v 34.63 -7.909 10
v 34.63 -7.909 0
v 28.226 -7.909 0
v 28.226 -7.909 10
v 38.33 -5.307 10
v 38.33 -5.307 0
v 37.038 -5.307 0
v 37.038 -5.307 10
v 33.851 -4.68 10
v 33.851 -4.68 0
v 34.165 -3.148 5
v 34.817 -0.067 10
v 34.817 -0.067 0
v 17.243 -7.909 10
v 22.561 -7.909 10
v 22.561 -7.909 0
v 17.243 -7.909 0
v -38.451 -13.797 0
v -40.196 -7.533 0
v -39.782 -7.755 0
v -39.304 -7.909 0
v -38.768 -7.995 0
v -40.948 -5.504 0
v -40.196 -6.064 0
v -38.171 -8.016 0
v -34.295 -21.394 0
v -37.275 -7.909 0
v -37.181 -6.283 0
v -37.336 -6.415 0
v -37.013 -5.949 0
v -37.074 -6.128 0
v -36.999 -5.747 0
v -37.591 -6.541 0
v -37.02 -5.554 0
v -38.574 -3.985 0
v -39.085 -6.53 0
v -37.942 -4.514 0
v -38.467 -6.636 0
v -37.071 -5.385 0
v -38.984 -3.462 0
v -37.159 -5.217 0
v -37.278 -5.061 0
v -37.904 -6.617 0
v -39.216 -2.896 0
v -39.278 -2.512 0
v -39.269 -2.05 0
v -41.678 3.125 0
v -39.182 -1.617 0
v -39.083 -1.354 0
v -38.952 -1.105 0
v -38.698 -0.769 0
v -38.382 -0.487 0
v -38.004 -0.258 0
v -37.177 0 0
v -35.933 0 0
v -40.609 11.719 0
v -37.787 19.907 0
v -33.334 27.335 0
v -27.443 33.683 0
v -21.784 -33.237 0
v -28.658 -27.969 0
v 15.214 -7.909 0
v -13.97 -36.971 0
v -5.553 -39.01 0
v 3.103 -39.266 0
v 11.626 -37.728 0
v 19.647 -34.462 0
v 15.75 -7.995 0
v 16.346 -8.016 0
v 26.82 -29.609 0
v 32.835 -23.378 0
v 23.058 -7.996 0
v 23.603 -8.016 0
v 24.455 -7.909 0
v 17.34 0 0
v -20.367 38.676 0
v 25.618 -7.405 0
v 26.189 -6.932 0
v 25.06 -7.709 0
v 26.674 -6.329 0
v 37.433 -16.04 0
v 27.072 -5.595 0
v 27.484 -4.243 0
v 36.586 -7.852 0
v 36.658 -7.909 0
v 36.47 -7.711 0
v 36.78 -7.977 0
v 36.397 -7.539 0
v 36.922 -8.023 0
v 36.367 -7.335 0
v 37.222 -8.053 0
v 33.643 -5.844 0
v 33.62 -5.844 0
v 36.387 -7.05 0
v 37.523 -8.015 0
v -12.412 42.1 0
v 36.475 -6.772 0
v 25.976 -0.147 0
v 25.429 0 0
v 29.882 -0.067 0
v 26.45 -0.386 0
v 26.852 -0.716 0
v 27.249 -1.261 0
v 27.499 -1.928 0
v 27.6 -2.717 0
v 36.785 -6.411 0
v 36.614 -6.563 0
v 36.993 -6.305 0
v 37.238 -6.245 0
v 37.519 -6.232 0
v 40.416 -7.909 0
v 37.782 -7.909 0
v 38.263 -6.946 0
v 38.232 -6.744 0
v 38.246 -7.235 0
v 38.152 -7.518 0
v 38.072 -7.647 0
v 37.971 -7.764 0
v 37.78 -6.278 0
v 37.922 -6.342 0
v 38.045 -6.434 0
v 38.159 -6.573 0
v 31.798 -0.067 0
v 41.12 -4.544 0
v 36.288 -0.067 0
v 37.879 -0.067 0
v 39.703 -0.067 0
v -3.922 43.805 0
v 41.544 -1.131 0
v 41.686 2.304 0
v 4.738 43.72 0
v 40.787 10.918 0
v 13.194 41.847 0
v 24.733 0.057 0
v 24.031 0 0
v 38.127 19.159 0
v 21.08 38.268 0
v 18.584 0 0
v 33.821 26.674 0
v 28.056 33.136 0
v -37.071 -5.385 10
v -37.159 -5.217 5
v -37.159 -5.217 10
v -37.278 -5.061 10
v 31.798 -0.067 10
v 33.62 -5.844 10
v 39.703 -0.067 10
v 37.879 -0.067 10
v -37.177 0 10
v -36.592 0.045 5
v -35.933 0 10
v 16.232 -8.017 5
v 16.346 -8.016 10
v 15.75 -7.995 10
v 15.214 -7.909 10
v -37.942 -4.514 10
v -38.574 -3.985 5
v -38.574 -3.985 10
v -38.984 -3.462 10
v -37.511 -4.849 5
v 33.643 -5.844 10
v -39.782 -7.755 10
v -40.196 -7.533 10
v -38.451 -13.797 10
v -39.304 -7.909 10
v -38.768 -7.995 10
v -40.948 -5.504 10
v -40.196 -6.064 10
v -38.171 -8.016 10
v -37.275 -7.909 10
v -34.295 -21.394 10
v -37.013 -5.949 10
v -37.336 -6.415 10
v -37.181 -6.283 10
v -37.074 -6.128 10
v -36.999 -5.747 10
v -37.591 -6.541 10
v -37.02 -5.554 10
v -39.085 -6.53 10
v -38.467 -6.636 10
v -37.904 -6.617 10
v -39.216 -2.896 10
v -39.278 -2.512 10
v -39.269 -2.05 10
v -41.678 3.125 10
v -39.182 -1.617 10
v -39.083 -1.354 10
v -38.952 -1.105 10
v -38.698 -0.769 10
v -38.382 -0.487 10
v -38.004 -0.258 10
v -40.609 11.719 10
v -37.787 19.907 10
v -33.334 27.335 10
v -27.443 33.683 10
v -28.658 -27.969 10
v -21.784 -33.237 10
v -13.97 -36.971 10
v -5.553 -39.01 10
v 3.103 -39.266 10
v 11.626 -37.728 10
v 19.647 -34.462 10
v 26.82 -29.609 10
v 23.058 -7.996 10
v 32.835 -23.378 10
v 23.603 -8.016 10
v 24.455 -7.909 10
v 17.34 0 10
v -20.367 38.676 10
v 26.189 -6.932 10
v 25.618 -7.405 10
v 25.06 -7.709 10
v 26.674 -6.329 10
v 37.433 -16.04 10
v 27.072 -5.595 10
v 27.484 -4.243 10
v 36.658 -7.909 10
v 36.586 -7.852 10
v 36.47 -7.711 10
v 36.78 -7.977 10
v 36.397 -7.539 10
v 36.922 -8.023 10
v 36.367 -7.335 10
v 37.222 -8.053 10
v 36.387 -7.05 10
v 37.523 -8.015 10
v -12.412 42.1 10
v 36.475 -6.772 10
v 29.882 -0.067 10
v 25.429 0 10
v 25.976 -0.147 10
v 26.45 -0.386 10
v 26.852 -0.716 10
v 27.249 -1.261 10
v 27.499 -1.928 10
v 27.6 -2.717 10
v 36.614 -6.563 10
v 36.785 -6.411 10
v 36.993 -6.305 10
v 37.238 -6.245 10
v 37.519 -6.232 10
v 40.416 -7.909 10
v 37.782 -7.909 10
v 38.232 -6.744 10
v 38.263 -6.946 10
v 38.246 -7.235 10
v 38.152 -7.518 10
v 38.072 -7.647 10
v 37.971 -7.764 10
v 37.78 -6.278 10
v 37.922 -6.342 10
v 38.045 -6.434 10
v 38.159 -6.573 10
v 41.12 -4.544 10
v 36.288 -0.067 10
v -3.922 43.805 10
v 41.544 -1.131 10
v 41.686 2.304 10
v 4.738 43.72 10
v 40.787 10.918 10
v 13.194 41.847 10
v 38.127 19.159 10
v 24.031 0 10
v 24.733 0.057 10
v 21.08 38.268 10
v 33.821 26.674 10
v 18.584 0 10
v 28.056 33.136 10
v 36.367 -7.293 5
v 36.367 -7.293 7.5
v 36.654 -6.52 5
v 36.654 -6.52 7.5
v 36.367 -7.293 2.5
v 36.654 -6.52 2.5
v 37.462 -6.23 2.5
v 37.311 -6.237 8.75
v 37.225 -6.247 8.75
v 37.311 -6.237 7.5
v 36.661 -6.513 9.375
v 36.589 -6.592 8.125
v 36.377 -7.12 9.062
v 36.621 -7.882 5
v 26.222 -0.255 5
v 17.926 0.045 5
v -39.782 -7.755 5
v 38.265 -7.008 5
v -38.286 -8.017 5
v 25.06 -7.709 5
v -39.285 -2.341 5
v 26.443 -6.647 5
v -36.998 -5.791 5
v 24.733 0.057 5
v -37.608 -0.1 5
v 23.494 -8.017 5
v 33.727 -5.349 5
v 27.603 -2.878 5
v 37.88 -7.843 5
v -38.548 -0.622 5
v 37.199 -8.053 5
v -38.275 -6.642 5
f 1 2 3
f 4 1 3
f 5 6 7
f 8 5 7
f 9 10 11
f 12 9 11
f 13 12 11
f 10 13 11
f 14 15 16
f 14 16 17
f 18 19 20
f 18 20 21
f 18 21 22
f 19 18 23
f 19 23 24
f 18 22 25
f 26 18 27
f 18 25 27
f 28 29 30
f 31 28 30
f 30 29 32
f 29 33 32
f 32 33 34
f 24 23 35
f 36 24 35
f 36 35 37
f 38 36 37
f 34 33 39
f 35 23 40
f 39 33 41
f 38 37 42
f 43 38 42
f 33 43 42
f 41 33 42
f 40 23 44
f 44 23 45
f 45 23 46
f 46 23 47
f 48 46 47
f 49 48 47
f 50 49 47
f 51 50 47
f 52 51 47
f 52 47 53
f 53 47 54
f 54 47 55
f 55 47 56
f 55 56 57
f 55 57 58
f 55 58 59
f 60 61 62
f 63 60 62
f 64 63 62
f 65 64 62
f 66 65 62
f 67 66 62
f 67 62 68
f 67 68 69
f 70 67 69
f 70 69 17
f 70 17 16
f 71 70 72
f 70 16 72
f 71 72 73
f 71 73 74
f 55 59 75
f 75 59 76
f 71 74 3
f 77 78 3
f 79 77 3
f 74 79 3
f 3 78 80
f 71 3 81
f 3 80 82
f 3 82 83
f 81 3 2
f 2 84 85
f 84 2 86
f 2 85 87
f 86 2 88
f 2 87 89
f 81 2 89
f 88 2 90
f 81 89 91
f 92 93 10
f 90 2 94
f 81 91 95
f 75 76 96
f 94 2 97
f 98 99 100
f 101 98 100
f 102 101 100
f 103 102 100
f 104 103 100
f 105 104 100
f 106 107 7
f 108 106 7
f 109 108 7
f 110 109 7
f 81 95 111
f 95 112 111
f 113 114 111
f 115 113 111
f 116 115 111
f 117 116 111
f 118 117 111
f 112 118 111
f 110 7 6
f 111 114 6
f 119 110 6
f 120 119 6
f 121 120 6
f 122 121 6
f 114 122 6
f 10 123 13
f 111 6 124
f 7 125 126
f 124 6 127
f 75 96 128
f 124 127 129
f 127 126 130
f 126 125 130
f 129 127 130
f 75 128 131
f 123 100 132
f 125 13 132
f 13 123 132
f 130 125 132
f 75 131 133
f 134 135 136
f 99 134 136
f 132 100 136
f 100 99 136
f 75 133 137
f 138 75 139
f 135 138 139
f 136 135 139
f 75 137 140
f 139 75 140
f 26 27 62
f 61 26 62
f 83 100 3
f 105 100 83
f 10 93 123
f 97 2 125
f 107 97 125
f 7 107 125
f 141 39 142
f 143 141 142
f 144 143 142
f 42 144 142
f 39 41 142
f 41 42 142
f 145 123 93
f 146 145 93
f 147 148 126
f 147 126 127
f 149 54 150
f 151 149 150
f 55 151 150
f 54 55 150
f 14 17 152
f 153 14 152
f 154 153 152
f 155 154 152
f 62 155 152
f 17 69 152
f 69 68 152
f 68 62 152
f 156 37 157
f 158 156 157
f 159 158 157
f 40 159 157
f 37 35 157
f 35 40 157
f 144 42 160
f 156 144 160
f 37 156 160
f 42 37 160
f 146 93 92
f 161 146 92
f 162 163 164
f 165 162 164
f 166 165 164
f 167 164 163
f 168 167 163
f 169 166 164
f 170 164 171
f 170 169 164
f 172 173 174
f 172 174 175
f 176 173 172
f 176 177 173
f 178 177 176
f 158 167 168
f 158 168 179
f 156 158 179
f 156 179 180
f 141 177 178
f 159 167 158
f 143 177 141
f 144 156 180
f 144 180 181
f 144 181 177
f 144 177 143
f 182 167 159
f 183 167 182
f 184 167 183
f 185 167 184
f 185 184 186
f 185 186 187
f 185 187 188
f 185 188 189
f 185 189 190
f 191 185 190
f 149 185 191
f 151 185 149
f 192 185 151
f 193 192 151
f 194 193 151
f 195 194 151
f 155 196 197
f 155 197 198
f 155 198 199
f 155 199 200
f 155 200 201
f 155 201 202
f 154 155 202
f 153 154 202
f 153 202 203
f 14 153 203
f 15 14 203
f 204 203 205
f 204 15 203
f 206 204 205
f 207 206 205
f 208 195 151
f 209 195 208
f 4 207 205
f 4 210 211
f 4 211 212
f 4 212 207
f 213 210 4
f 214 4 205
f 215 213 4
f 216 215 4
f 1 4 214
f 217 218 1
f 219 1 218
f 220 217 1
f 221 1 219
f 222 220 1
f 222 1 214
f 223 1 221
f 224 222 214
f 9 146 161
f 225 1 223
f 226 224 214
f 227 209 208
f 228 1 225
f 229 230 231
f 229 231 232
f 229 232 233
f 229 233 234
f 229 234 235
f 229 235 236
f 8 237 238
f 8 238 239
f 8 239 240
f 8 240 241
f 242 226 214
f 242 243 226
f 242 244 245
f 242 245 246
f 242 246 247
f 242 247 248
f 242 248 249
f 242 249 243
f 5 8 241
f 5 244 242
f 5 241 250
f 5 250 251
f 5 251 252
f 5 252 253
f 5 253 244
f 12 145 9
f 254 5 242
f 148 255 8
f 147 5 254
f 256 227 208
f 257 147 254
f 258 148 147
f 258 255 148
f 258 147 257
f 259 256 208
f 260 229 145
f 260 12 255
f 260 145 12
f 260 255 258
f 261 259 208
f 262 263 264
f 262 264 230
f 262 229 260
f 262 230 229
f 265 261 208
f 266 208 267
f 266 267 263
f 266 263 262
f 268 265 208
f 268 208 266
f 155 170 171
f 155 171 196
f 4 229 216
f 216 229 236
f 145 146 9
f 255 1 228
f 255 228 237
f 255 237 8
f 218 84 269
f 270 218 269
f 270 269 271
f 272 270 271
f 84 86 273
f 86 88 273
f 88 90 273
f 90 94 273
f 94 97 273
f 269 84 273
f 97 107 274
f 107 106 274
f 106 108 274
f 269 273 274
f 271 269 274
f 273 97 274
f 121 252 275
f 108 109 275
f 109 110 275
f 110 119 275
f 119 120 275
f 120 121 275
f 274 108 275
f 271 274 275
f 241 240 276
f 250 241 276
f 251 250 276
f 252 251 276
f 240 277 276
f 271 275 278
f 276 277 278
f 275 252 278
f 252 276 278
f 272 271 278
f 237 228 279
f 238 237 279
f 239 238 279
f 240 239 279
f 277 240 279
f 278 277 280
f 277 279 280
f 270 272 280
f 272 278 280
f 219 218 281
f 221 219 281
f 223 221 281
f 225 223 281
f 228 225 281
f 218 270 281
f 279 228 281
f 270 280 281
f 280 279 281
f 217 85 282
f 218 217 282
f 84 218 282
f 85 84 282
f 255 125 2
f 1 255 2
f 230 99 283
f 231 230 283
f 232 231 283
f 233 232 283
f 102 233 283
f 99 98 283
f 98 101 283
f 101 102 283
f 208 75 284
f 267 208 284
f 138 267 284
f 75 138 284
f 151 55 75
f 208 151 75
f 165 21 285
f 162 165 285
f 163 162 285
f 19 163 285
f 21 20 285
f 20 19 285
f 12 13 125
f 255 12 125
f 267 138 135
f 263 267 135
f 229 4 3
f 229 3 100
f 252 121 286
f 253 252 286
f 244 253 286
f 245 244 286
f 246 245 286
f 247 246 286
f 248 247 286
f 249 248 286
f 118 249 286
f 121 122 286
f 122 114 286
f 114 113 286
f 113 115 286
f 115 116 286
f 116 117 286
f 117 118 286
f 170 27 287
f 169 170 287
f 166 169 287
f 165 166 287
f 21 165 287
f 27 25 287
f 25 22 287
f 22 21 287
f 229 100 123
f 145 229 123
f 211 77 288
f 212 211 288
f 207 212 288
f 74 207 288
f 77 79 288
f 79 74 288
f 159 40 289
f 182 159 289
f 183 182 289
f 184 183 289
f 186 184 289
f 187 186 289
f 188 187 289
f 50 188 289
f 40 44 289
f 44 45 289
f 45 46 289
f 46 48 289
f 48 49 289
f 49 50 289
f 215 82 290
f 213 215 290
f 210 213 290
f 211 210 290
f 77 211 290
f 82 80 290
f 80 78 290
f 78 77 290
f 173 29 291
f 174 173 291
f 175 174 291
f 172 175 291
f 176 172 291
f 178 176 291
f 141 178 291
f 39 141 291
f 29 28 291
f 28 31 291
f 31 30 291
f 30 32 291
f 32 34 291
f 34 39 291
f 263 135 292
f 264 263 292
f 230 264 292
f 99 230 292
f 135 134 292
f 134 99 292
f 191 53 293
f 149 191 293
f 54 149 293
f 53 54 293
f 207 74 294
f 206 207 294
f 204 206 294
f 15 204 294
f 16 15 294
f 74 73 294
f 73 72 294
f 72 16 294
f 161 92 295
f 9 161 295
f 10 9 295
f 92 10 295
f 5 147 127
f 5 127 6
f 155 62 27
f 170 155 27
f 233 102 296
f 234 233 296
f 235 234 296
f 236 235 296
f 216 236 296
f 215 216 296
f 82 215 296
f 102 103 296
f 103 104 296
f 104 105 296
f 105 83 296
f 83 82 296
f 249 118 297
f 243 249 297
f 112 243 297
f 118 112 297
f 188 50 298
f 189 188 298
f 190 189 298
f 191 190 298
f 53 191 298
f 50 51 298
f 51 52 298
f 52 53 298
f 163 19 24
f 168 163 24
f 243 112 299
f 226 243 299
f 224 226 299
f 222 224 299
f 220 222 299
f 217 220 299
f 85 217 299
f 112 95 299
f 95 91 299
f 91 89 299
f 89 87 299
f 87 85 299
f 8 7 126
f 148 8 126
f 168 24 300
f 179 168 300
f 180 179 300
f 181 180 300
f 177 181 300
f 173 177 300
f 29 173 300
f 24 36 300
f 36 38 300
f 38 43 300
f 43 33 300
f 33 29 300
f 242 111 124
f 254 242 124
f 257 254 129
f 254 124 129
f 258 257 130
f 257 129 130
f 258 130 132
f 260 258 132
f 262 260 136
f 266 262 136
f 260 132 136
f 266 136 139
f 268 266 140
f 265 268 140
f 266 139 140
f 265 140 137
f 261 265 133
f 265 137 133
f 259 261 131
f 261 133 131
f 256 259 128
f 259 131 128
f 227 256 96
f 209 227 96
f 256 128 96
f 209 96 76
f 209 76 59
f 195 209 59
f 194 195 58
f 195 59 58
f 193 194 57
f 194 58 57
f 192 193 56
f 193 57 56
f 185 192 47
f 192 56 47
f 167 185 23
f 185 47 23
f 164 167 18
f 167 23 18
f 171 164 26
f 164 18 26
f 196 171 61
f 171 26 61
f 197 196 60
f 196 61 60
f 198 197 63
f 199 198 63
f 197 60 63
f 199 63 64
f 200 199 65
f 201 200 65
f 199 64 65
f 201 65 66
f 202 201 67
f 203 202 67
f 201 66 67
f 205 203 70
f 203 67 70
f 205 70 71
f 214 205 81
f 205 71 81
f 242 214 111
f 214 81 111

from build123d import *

# Parameters (mm, degrees)
F1_DEPTH = 10


with BuildPart() as f1:
    # F0 (on Top) → F1 (new body)
    with BuildSketch(Plane.XY):
        with BuildLine():
            ThreePointArc((40.4156393511, -7.9090867682), (41.3673030509, -2.8418043205), (41.6861501393, 2.3041991517))
            ThreePointArc((41.6861501393, 2.3041991517), (-5.1460034722, 43.6715022026), (-40.4156393511, -7.9090867682))
            Line((-40.4156393511, -7.9090867682), (-40.4156393511, 0))
            Line((-40.4156393511, 0), (-37.1771354638, 0))
            add(Edge.make_bspline(
                [(-37.1771354638, 0), (-36.8978650572, 0.0446259236), (-36.5915409745, 0.0446259236)],
                knots=[0.6161917381, 0.6161917381, 0.6161917381, 1, 1, 1], degree=2))
            add(Edge.make_bspline(
                [(-36.5915409745, 0.0446259236), (-36.2539809593, 0.0446259236), (-35.9330292975, 0)],
                knots=[0, 0, 0, 0.2900730853, 0.2900730853, 0.2900730853], degree=2))
            Line((-35.9330292975, 0), (17.3402957465, 0))
            add(Edge.make_bspline(
                [(17.3402957465, 0), (17.6195661531, 0.0446259236), (17.9258902358, 0.0446259236)],
                knots=[0.6161917381, 0.6161917381, 0.6161917381, 1, 1, 1], degree=2))
            add(Edge.make_bspline(
                [(17.9258902358, 0.0446259236), (18.263450251, 0.0446259236), (18.5844019128, 0)],
                knots=[0, 0, 0, 0.2900730853, 0.2900730853, 0.2900730853], degree=2))
            Line((18.5844019128, 0), (24.0306765024, 0))
            add(Edge.make_bspline(
                [(24.0306765024, 0), (24.369078423, 0.0566405953), (24.7330599673, 0.0566405953)],
                knots=[0.7021583014, 0.7021583014, 0.7021583014, 1, 1, 1], degree=2))
            add(Edge.make_bspline(
                [(24.7330599673, 0.0566405953), (25.1035042565, 0.0566405953), (25.4286990035, 0)],
                knots=[0, 0, 0, 0.2708012802, 0.2708012802, 0.2708012802], degree=2))
            Line((25.4286990035, 0), (40.4156393511, 0))
            Line((40.4156393511, 0), (40.4156393511, -7.9090867682))
        make_face()
        with BuildLine():
            Line((-39.3036225538, -7.9090867682), (-40.4156393511, -7.9090867682))
            ThreePointArc((-40.4156393511, -7.9090867682), (0, -39.3819509876), (40.4156393511, -7.9090867682))
            Line((40.4156393511, -7.9090867682), (37.7818098534, -7.9090867682))
            add(Edge.make_bspline(
                [(37.7818098534, -7.9090867682), (37.5360380286, -8.053262829), (37.1991400882, -8.053262829)],
                knots=[0.2939431181, 0.2939431181, 0.2939431181, 1, 1, 1], degree=2))
            add(Edge.make_bspline(
                [(37.1991400882, -8.053262829), (36.8661003441, -8.053262829), (36.6575202765, -7.9090867682)],
                knots=[0, 0, 0, 0.8473185457, 0.8473185457, 0.8473185457], degree=2))
            Line((36.6575202765, -7.9090867682), (34.6297167175, -7.9090867682))
            Line((34.6297167175, -7.9090867682), (32.7949047047, -7.9090867682))
            Line((32.7949047047, -7.9090867682), (29.7002685409, -7.9090867682))
            Line((29.7002685409, -7.9090867682), (28.2258966802, -7.9090867682))
            Line((28.2258966802, -7.9090867682), (24.4546855592, -7.9090867682))
            add(Edge.make_bspline(
                [(24.4546855592, -7.9090867682), (23.9989033781, -8.0172188138), (23.4938323964, -8.0172188138)],
                knots=[0.5796214889, 0.5796214889, 0.5796214889, 1, 1, 1], degree=2))
            add(Edge.make_bspline(
                [(23.4938323964, -8.0172188138), (22.9862299942, -8.0172188138), (22.5610753448, -7.9090867682)],
                knots=[0, 0, 0, 0.3696747706, 0.3696747706, 0.3696747706], degree=2))
            Line((22.5610753448, -7.9090867682), (17.2428330681, -7.9090867682))
            add(Edge.make_bspline(
                [(17.2428330681, -7.9090867682), (16.7839236692, -8.0172188138), (16.2318215205, -8.0172188138)],
                knots=[0.5928274645, 0.5928274645, 0.5928274645, 1, 1, 1], degree=2))
            add(Edge.make_bspline(
                [(16.2318215205, -8.0172188138), (15.671241471, -8.0172188138), (15.2138086565, -7.9090867682)],
                knots=[0, 0, 0, 0.4726565934, 0.4726565934, 0.4726565934], degree=2))
            Line((15.2138086565, -7.9090867682), (12.4883930827, -7.9090867682))
            Line((12.4883930827, -7.9090867682), (10.8526813444, -7.9090867682))
            Line((10.8526813444, -7.9090867682), (5.8374140839, -7.9090867682))
            Line((5.8374140839, -7.9090867682), (3.4190323008, -7.9090867682))
            Line((3.4190323008, -7.9090867682), (-1.5962349597, -7.9090867682))
            Line((-1.5962349597, -7.9090867682), (-4.0146167428, -7.9090867682))
            Line((-4.0146167428, -7.9090867682), (-4.9603430469, -7.9090867682))
            Line((-4.9603430469, -7.9090867682), (-6.5531452432, -7.9090867682))
            Line((-6.5531452432, -7.9090867682), (-10.1403829484, -7.9090867682))
            Line((-10.1403829484, -7.9090867682), (-11.8567646255, -7.9090867682))
            Line((-11.8567646255, -7.9090867682), (-14.7128237363, -7.9090867682))
            Line((-14.7128237363, -7.9090867682), (-16.3056259326, -7.9090867682))
            Line((-16.3056259326, -7.9090867682), (-19.8928636378, -7.9090867682))
            Line((-19.8928636378, -7.9090867682), (-21.6092453149, -7.9090867682))
            Line((-21.6092453149, -7.9090867682), (-22.2374410087, -7.9090867682))
            Line((-22.2374410087, -7.9090867682), (-26.6193634304, -7.9090867682))
            Line((-26.6193634304, -7.9090867682), (-28.5073832753, -7.9090867682))
            Line((-28.5073832753, -7.9090867682), (-30.1482441586, -7.9090867682))
            Line((-30.1482441586, -7.9090867682), (-32.6747579873, -7.9090867682))
            Line((-32.6747579873, -7.9090867682), (-34.3104697256, -7.9090867682))
            Line((-34.3104697256, -7.9090867682), (-37.2745981422, -7.9090867682))
            add(Edge.make_bspline(
                [(-37.2745981422, -7.9090867682), (-37.7335075411, -8.0172188138), (-38.2856096898, -8.0172188138)],
                knots=[0.5928274645, 0.5928274645, 0.5928274645, 1, 1, 1], degree=2))
            add(Edge.make_bspline(
                [(-38.2856096898, -8.0172188138), (-38.8461897393, -8.0172188138), (-39.3036225538, -7.9090867682)],
                knots=[0, 0, 0, 0.4726565934, 0.4726565934, 0.4726565934], degree=2))
        make_face()
        with BuildLine():
            Line((-40.4156393511, 0), (-40.4156393511, -7.9090867682))
            Line((-40.4156393511, -7.9090867682), (-39.3036225538, -7.9090867682))
            add(Edge.make_bspline(
                [(-39.3036225538, -7.9090867682), (-39.8139807759, -7.788443743), (-40.1959424964, -7.5331991809)],
                knots=[0.4726565934, 0.4726565934, 0.4726565934, 1, 1, 1], degree=2))
            Line((-40.1959424964, -7.5331991809), (-40.1959424964, -6.0639764653))
            add(Edge.make_bspline(
                [(-40.1959424964, -6.0639764653), (-39.1609643451, -6.6423970904), (-38.2753113997, -6.6423970904)],
                knots=[0, 0, 0, 1, 1, 1], degree=2))
            add(Edge.make_bspline(
                [(-38.2753113997, -6.6423970904), (-37.6745778127, -6.6423970904), (-37.3364506223, -6.4149765182)],
                knots=[0, 0, 0, 1, 1, 1], degree=2))
            add(Edge.make_bspline(
                [(-37.3364506223, -6.4149765182), (-36.998323432, -6.187555946), (-36.998323432, -5.7910717786)],
                knots=[0, 0, 0, 1, 1, 1], degree=2))
            add(Edge.make_bspline(
                [(-36.998323432, -5.7910717786), (-36.998323432, -5.5593602522), (-37.0712696532, -5.385147512)],
                knots=[0, 0, 0, 1, 1, 1], degree=2))
            add(Edge.make_bspline(
                [(-37.0712696532, -5.385147512), (-37.1442158745, -5.2109347717), (-37.2780936453, -5.060751375)],
                knots=[0, 0, 0, 1, 1, 1], degree=2))
            add(Edge.make_bspline(
                [(-37.2780936453, -5.060751375), (-37.4119714161, -4.9105679782), (-37.9423333544, -4.5140838108)],
                knots=[0, 0, 0, 1, 1, 1], degree=2))
            add(Edge.make_bspline(
                [(-37.9423333544, -4.5140838108), (-38.6838102389, -3.9820054909), (-38.9841770324, -3.4619418427)],
                knots=[0, 0, 0, 1, 1, 1], degree=2))
            add(Edge.make_bspline(
                [(-38.9841770324, -3.4619418427), (-39.2845438259, -2.9418781946), (-39.2845438259, -2.3411446076)],
                knots=[0, 0, 0, 1, 1, 1], degree=2))
            add(Edge.make_bspline(
                [(-39.2845438259, -2.3411446076), (-39.2845438259, -1.6494427917), (-38.9515657805, -1.1053498001)],
                knots=[0, 0, 0, 1, 1, 1], degree=2))
            add(Edge.make_bspline(
                [(-38.9515657805, -1.1053498001), (-38.6185877352, -0.5612568084), (-38.0041230947, -0.2583154424)],
                knots=[0, 0, 0, 1, 1, 1], degree=2))
            add(Edge.make_bspline(
                [(-38.0041230947, -0.2583154424), (-37.6254950599, -0.0716454755), (-37.1771354638, 0)],
                knots=[0, 0, 0, 0.6161917381, 0.6161917381, 0.6161917381], degree=2))
            Line((-37.1771354638, 0), (-40.4156393511, 0))
        make_face()
        with BuildLine():
            Line((37.7818098534, -7.9090867682), (40.4156393511, -7.9090867682))
            Line((40.4156393511, -7.9090867682), (40.4156393511, 0))
            Line((40.4156393511, 0), (25.4286990035, 0))
            add(Edge.make_bspline(
                [(25.4286990035, 0), (26.3043654444, -0.1525186646), (26.8519331477, -0.7157311594)],
                knots=[0.2708012802, 0.2708012802, 0.2708012802, 1, 1, 1], degree=2))
            add(Edge.make_bspline(
                [(26.8519331477, -0.7157311594), (27.6028501314, -1.4881029141), (27.6028501314, -2.8783720725)],
                knots=[0, 0, 0, 1, 1, 1], degree=2))
            add(Edge.make_bspline(
                [(27.6028501314, -2.8783720725), (27.6028501314, -4.3956534751), (27.0716300023, -5.5945460766)],
                knots=[0, 0, 0, 1, 1, 1], degree=2))
            add(Edge.make_bspline(
                [(27.0716300023, -5.5945460766), (26.5404098733, -6.793438678), (25.6178547218, -7.4053287459)],
                knots=[0, 0, 0, 1, 1, 1], degree=2))
            add(Edge.make_bspline(
                [(25.6178547218, -7.4053287459), (25.0831219313, -7.7599933781), (24.4546855592, -7.9090867682)],
                knots=[0, 0, 0, 0.5796214889, 0.5796214889, 0.5796214889], degree=2))
            Line((24.4546855592, -7.9090867682), (28.2258966802, -7.9090867682))
            Line((28.2258966802, -7.9090867682), (29.8822049986, -0.0669388854))
            Line((29.8822049986, -0.0669388854), (31.7976869503, -0.0669388854))
            Line((31.7976869503, -0.0669388854), (33.6204842914, -5.8442796106))
            Line((33.6204842914, -5.8442796106), (33.6427972532, -5.8442796106))
            add(Edge.make_bspline(
                [(33.6427972532, -5.8442796106), (33.7063033752, -5.4357807714), (33.851337627, -4.6797146427)],
                knots=[0, 0, 0, 1, 1, 1], degree=2))
            add(Edge.make_bspline(
                [(33.851337627, -4.6797146427), (33.9963718787, -3.9236485139), (34.8168023203, -0.0669388854)],
                knots=[0, 0, 0, 1, 1, 1], degree=2))
            Line((34.8168023203, -0.0669388854), (36.2877414176, -0.0669388854))
            Line((36.2877414176, -0.0669388854), (34.6297167175, -7.9090867682))
            Line((34.6297167175, -7.9090867682), (36.6575202765, -7.9090867682))
            add(Edge.make_bspline(
                [(36.6575202765, -7.9090867682), (36.6199354647, -7.8831071519), (36.5863918294, -7.8524461728)],
                knots=[0.8473185457, 0.8473185457, 0.8473185457, 1, 1, 1], degree=2))
            add(Edge.make_bspline(
                [(36.5863918294, -7.8524461728), (36.3666949748, -7.6516295166), (36.3666949748, -7.2929057461)],
                knots=[0, 0, 0, 1, 1, 1], degree=2))
            add(Edge.make_bspline(
                [(36.3666949748, -7.2929057461), (36.3666949748, -6.8088861131), (36.6541889057, -6.5196758005)],
                knots=[0, 0, 0, 1, 1, 1], degree=2))
            add(Edge.make_bspline(
                [(36.6541889057, -6.5196758005), (36.9416828366, -6.2304654879), (37.4617464848, -6.2304654879)],
                knots=[0, 0, 0, 1, 1, 1], degree=2))
            add(Edge.make_bspline(
                [(37.4617464848, -6.2304654879), (37.8256194003, -6.2304654879), (38.045316255, -6.4338567167)],
                knots=[0, 0, 0, 1, 1, 1], degree=2))
            add(Edge.make_bspline(
                [(38.045316255, -6.4338567167), (38.2650131097, -6.6372479454), (38.2650131097, -7.0079863877)],
                knots=[0, 0, 0, 1, 1, 1], degree=2))
            add(Edge.make_bspline(
                [(38.2650131097, -7.0079863877), (38.2650131097, -7.4748422038), (37.970653652, -7.7640525164)],
                knots=[0, 0, 0, 1, 1, 1], degree=2))
            add(Edge.make_bspline(
                [(37.970653652, -7.7640525164), (37.8841287152, -7.8490638975), (37.7818098534, -7.9090867682)],
                knots=[0, 0, 0, 0.2939431181, 0.2939431181, 0.2939431181], degree=2))
        make_face()
        Polygon((39.7033409551, -0.0669388854), (38.3302356134, -5.3070521456), (37.0378002105, -5.3070521456), (37.8788272323, -0.0669388854), align=None, mode=Mode.SUBTRACT)
    extrude(amount=F1_DEPTH)


solid = f1.part
